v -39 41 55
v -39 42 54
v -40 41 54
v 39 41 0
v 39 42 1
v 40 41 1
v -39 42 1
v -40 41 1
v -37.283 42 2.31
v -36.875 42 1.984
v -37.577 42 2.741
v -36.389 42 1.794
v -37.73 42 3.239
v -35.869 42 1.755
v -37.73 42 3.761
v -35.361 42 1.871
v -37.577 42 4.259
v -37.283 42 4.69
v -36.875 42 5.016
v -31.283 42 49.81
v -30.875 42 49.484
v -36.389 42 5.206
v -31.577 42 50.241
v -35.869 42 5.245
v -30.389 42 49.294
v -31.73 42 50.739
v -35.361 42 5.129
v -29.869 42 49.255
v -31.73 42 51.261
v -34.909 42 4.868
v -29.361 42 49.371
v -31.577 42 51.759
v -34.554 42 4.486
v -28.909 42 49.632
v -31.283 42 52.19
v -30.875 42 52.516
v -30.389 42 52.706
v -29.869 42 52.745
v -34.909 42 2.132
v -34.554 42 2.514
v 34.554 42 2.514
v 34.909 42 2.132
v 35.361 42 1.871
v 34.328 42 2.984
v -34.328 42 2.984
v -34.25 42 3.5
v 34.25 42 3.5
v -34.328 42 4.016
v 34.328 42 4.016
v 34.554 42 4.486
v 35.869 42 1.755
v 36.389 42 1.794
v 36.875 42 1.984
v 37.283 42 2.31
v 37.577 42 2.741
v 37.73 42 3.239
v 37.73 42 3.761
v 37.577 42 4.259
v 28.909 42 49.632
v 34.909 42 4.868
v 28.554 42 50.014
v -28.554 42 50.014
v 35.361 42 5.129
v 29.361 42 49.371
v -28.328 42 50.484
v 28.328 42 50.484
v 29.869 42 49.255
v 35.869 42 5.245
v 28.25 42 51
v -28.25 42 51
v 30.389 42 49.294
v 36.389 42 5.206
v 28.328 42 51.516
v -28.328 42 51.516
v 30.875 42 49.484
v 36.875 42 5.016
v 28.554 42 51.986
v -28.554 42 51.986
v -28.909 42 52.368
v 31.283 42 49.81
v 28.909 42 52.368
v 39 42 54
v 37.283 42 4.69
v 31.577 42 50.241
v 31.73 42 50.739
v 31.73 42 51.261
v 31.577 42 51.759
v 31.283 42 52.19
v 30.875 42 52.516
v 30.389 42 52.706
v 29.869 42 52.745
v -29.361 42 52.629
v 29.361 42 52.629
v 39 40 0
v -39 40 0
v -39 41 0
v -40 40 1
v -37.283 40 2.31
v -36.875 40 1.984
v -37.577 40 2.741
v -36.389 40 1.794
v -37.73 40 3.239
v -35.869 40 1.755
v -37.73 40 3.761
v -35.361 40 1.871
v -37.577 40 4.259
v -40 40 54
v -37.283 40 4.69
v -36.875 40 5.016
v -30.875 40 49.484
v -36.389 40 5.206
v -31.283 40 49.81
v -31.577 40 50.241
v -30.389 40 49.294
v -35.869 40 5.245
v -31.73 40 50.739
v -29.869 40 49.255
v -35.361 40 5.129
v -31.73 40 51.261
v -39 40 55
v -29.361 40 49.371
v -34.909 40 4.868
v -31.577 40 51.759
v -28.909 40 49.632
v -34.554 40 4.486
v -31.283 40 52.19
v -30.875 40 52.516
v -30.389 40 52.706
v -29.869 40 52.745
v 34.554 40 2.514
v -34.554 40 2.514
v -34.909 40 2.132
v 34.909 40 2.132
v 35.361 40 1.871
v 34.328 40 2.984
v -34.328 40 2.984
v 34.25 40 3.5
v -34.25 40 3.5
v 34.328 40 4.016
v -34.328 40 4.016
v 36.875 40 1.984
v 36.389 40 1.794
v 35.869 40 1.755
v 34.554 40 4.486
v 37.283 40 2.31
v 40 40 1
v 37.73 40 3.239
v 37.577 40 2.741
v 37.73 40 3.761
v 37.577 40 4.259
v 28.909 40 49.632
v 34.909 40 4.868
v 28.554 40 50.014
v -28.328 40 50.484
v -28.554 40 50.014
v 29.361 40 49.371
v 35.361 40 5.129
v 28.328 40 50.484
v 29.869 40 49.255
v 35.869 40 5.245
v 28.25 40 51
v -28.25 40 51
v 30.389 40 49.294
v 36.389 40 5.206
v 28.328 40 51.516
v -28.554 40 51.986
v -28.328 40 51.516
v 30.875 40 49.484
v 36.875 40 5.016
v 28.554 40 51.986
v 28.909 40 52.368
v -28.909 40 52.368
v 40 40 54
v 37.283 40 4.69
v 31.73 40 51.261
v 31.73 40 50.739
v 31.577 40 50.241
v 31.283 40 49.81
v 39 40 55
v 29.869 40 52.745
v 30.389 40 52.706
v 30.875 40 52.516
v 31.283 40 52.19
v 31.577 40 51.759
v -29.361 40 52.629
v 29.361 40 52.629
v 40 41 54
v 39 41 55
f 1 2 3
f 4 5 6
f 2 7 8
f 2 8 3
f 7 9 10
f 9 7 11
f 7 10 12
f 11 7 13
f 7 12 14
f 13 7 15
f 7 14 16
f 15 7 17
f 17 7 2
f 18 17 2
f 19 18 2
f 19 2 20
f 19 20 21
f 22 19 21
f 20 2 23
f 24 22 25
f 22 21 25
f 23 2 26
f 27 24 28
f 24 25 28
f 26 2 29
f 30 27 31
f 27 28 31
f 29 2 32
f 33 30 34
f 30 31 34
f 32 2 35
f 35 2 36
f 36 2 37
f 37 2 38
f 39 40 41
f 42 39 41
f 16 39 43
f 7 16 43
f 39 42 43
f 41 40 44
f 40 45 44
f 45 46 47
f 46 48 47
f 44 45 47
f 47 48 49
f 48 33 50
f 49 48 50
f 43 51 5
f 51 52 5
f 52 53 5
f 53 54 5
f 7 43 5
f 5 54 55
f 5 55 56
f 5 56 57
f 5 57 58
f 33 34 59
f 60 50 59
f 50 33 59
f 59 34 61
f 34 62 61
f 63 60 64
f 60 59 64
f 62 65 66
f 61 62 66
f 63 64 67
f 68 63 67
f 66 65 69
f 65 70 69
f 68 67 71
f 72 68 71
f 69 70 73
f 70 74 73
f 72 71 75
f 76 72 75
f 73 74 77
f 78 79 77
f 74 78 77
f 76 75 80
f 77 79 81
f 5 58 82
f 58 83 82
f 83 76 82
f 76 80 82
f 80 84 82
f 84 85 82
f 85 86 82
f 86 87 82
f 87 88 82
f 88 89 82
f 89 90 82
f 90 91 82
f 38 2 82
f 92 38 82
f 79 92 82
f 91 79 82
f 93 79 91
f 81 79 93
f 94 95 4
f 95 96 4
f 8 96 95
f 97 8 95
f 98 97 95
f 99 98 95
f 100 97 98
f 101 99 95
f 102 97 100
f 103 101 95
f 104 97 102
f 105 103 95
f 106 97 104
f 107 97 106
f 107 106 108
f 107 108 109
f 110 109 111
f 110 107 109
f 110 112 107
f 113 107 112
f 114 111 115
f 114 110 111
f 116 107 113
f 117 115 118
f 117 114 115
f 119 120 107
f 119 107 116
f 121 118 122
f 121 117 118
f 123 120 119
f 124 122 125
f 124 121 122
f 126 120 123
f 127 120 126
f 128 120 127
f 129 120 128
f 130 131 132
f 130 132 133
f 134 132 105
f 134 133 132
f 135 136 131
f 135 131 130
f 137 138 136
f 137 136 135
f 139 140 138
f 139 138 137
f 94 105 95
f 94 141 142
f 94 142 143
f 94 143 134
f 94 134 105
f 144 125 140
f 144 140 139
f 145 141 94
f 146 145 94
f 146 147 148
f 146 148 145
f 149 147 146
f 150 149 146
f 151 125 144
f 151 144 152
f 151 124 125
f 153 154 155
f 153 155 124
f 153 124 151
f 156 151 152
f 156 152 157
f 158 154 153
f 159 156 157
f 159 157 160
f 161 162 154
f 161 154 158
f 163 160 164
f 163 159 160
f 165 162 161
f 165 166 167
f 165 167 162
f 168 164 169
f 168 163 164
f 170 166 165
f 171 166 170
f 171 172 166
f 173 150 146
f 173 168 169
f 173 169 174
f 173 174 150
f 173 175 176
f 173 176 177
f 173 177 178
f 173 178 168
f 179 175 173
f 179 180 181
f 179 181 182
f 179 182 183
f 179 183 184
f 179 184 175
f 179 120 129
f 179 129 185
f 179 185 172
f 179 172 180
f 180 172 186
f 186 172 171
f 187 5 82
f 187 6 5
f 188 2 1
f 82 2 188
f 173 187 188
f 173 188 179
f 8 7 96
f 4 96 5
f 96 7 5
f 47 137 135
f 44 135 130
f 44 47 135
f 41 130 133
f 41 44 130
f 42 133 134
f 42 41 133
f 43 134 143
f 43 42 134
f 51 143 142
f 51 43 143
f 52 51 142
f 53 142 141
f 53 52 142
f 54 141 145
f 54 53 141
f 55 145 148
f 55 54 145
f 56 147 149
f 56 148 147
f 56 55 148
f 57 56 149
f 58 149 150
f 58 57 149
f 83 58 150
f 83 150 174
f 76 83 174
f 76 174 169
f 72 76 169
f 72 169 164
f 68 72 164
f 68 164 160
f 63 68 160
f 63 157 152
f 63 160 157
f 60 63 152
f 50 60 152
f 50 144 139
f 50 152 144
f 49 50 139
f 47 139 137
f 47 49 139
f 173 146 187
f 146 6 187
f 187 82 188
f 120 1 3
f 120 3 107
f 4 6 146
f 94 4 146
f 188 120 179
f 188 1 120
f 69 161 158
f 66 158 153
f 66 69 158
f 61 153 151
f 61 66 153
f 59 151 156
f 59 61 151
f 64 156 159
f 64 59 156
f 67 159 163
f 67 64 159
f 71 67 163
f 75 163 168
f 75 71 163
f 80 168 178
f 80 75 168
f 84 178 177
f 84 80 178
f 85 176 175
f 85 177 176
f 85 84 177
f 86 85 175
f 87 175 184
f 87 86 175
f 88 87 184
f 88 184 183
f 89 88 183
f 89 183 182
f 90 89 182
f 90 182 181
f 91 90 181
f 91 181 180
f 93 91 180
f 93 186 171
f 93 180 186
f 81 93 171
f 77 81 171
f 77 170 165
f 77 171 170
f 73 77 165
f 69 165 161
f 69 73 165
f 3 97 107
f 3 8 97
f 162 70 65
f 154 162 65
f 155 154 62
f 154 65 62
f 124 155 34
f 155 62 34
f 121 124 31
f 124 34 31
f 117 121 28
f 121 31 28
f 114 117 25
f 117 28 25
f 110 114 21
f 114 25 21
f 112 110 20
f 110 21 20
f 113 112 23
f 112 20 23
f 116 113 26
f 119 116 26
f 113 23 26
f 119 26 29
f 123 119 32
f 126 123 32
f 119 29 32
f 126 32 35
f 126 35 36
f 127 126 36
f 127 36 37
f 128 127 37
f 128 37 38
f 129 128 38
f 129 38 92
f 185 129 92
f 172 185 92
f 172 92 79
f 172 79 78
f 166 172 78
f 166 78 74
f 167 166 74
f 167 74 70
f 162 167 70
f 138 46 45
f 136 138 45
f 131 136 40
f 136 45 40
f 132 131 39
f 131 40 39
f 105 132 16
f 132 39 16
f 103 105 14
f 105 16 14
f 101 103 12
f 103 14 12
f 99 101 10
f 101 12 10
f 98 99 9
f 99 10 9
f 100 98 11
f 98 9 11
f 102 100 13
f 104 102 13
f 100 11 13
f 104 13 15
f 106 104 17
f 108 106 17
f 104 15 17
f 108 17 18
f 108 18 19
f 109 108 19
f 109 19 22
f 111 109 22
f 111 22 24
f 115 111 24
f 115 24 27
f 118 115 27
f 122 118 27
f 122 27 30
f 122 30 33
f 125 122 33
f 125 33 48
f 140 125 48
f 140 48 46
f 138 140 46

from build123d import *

# Parameters (mm, degrees)
SKETCH045_W     = 80
SKETCH045_H     = 55
PAD012_DEPTH    = 2
SKETCH046_R     = 1.75
POCKET037_DEPTH = 5
CHAMFER_SIZE    = 1


with BuildPart() as part:
    # Sketch045 → Pad012 (new body)
    with BuildSketch(Plane.XZ):
        with Locations((0, 27.5)):
            Rectangle(SKETCH045_W, SKETCH045_H)
    extrude(amount=PAD012_DEPTH)

    # Sketch046 (on Face5 of Pad012) → Pocket037 (cut)
    with BuildSketch(Plane(origin=(0, 0, 0), x_dir=(1, 0, 0), z_dir=(0, 1, 0))):
        with Locations((-36, -3.5)):
            Circle(SKETCH046_R)
        with Locations((-30, -51)):
            Circle(SKETCH046_R)
    pocket037 = extrude(amount=-POCKET037_DEPTH, mode=Mode.SUBTRACT)

    # Mirrored001: Pocket037 across Sketch046 V_Axis
    add(pocket037.mirror(Plane.YZ), mode=Mode.SUBTRACT)

    # Chamfer
    chamfer_edges = [part.edges().sort_by_distance(p)[0] for p in [
        (40, 0, 27.5),
        (0, 0, 55),
        (0, 0, 0),
        (-40, 0, 27.5),
        (40, -1, 55),
        (-40, -1, 55),
        (-40, -1, 0),
        (40, -1, 0),
    ]]
    chamfer(chamfer_edges, length=CHAMFER_SIZE)


with BuildPart() as part_1:
    # Body004 placement: moved
    add(part.part.moved(Location((0, 42, 0))))


solid = part_1.part
